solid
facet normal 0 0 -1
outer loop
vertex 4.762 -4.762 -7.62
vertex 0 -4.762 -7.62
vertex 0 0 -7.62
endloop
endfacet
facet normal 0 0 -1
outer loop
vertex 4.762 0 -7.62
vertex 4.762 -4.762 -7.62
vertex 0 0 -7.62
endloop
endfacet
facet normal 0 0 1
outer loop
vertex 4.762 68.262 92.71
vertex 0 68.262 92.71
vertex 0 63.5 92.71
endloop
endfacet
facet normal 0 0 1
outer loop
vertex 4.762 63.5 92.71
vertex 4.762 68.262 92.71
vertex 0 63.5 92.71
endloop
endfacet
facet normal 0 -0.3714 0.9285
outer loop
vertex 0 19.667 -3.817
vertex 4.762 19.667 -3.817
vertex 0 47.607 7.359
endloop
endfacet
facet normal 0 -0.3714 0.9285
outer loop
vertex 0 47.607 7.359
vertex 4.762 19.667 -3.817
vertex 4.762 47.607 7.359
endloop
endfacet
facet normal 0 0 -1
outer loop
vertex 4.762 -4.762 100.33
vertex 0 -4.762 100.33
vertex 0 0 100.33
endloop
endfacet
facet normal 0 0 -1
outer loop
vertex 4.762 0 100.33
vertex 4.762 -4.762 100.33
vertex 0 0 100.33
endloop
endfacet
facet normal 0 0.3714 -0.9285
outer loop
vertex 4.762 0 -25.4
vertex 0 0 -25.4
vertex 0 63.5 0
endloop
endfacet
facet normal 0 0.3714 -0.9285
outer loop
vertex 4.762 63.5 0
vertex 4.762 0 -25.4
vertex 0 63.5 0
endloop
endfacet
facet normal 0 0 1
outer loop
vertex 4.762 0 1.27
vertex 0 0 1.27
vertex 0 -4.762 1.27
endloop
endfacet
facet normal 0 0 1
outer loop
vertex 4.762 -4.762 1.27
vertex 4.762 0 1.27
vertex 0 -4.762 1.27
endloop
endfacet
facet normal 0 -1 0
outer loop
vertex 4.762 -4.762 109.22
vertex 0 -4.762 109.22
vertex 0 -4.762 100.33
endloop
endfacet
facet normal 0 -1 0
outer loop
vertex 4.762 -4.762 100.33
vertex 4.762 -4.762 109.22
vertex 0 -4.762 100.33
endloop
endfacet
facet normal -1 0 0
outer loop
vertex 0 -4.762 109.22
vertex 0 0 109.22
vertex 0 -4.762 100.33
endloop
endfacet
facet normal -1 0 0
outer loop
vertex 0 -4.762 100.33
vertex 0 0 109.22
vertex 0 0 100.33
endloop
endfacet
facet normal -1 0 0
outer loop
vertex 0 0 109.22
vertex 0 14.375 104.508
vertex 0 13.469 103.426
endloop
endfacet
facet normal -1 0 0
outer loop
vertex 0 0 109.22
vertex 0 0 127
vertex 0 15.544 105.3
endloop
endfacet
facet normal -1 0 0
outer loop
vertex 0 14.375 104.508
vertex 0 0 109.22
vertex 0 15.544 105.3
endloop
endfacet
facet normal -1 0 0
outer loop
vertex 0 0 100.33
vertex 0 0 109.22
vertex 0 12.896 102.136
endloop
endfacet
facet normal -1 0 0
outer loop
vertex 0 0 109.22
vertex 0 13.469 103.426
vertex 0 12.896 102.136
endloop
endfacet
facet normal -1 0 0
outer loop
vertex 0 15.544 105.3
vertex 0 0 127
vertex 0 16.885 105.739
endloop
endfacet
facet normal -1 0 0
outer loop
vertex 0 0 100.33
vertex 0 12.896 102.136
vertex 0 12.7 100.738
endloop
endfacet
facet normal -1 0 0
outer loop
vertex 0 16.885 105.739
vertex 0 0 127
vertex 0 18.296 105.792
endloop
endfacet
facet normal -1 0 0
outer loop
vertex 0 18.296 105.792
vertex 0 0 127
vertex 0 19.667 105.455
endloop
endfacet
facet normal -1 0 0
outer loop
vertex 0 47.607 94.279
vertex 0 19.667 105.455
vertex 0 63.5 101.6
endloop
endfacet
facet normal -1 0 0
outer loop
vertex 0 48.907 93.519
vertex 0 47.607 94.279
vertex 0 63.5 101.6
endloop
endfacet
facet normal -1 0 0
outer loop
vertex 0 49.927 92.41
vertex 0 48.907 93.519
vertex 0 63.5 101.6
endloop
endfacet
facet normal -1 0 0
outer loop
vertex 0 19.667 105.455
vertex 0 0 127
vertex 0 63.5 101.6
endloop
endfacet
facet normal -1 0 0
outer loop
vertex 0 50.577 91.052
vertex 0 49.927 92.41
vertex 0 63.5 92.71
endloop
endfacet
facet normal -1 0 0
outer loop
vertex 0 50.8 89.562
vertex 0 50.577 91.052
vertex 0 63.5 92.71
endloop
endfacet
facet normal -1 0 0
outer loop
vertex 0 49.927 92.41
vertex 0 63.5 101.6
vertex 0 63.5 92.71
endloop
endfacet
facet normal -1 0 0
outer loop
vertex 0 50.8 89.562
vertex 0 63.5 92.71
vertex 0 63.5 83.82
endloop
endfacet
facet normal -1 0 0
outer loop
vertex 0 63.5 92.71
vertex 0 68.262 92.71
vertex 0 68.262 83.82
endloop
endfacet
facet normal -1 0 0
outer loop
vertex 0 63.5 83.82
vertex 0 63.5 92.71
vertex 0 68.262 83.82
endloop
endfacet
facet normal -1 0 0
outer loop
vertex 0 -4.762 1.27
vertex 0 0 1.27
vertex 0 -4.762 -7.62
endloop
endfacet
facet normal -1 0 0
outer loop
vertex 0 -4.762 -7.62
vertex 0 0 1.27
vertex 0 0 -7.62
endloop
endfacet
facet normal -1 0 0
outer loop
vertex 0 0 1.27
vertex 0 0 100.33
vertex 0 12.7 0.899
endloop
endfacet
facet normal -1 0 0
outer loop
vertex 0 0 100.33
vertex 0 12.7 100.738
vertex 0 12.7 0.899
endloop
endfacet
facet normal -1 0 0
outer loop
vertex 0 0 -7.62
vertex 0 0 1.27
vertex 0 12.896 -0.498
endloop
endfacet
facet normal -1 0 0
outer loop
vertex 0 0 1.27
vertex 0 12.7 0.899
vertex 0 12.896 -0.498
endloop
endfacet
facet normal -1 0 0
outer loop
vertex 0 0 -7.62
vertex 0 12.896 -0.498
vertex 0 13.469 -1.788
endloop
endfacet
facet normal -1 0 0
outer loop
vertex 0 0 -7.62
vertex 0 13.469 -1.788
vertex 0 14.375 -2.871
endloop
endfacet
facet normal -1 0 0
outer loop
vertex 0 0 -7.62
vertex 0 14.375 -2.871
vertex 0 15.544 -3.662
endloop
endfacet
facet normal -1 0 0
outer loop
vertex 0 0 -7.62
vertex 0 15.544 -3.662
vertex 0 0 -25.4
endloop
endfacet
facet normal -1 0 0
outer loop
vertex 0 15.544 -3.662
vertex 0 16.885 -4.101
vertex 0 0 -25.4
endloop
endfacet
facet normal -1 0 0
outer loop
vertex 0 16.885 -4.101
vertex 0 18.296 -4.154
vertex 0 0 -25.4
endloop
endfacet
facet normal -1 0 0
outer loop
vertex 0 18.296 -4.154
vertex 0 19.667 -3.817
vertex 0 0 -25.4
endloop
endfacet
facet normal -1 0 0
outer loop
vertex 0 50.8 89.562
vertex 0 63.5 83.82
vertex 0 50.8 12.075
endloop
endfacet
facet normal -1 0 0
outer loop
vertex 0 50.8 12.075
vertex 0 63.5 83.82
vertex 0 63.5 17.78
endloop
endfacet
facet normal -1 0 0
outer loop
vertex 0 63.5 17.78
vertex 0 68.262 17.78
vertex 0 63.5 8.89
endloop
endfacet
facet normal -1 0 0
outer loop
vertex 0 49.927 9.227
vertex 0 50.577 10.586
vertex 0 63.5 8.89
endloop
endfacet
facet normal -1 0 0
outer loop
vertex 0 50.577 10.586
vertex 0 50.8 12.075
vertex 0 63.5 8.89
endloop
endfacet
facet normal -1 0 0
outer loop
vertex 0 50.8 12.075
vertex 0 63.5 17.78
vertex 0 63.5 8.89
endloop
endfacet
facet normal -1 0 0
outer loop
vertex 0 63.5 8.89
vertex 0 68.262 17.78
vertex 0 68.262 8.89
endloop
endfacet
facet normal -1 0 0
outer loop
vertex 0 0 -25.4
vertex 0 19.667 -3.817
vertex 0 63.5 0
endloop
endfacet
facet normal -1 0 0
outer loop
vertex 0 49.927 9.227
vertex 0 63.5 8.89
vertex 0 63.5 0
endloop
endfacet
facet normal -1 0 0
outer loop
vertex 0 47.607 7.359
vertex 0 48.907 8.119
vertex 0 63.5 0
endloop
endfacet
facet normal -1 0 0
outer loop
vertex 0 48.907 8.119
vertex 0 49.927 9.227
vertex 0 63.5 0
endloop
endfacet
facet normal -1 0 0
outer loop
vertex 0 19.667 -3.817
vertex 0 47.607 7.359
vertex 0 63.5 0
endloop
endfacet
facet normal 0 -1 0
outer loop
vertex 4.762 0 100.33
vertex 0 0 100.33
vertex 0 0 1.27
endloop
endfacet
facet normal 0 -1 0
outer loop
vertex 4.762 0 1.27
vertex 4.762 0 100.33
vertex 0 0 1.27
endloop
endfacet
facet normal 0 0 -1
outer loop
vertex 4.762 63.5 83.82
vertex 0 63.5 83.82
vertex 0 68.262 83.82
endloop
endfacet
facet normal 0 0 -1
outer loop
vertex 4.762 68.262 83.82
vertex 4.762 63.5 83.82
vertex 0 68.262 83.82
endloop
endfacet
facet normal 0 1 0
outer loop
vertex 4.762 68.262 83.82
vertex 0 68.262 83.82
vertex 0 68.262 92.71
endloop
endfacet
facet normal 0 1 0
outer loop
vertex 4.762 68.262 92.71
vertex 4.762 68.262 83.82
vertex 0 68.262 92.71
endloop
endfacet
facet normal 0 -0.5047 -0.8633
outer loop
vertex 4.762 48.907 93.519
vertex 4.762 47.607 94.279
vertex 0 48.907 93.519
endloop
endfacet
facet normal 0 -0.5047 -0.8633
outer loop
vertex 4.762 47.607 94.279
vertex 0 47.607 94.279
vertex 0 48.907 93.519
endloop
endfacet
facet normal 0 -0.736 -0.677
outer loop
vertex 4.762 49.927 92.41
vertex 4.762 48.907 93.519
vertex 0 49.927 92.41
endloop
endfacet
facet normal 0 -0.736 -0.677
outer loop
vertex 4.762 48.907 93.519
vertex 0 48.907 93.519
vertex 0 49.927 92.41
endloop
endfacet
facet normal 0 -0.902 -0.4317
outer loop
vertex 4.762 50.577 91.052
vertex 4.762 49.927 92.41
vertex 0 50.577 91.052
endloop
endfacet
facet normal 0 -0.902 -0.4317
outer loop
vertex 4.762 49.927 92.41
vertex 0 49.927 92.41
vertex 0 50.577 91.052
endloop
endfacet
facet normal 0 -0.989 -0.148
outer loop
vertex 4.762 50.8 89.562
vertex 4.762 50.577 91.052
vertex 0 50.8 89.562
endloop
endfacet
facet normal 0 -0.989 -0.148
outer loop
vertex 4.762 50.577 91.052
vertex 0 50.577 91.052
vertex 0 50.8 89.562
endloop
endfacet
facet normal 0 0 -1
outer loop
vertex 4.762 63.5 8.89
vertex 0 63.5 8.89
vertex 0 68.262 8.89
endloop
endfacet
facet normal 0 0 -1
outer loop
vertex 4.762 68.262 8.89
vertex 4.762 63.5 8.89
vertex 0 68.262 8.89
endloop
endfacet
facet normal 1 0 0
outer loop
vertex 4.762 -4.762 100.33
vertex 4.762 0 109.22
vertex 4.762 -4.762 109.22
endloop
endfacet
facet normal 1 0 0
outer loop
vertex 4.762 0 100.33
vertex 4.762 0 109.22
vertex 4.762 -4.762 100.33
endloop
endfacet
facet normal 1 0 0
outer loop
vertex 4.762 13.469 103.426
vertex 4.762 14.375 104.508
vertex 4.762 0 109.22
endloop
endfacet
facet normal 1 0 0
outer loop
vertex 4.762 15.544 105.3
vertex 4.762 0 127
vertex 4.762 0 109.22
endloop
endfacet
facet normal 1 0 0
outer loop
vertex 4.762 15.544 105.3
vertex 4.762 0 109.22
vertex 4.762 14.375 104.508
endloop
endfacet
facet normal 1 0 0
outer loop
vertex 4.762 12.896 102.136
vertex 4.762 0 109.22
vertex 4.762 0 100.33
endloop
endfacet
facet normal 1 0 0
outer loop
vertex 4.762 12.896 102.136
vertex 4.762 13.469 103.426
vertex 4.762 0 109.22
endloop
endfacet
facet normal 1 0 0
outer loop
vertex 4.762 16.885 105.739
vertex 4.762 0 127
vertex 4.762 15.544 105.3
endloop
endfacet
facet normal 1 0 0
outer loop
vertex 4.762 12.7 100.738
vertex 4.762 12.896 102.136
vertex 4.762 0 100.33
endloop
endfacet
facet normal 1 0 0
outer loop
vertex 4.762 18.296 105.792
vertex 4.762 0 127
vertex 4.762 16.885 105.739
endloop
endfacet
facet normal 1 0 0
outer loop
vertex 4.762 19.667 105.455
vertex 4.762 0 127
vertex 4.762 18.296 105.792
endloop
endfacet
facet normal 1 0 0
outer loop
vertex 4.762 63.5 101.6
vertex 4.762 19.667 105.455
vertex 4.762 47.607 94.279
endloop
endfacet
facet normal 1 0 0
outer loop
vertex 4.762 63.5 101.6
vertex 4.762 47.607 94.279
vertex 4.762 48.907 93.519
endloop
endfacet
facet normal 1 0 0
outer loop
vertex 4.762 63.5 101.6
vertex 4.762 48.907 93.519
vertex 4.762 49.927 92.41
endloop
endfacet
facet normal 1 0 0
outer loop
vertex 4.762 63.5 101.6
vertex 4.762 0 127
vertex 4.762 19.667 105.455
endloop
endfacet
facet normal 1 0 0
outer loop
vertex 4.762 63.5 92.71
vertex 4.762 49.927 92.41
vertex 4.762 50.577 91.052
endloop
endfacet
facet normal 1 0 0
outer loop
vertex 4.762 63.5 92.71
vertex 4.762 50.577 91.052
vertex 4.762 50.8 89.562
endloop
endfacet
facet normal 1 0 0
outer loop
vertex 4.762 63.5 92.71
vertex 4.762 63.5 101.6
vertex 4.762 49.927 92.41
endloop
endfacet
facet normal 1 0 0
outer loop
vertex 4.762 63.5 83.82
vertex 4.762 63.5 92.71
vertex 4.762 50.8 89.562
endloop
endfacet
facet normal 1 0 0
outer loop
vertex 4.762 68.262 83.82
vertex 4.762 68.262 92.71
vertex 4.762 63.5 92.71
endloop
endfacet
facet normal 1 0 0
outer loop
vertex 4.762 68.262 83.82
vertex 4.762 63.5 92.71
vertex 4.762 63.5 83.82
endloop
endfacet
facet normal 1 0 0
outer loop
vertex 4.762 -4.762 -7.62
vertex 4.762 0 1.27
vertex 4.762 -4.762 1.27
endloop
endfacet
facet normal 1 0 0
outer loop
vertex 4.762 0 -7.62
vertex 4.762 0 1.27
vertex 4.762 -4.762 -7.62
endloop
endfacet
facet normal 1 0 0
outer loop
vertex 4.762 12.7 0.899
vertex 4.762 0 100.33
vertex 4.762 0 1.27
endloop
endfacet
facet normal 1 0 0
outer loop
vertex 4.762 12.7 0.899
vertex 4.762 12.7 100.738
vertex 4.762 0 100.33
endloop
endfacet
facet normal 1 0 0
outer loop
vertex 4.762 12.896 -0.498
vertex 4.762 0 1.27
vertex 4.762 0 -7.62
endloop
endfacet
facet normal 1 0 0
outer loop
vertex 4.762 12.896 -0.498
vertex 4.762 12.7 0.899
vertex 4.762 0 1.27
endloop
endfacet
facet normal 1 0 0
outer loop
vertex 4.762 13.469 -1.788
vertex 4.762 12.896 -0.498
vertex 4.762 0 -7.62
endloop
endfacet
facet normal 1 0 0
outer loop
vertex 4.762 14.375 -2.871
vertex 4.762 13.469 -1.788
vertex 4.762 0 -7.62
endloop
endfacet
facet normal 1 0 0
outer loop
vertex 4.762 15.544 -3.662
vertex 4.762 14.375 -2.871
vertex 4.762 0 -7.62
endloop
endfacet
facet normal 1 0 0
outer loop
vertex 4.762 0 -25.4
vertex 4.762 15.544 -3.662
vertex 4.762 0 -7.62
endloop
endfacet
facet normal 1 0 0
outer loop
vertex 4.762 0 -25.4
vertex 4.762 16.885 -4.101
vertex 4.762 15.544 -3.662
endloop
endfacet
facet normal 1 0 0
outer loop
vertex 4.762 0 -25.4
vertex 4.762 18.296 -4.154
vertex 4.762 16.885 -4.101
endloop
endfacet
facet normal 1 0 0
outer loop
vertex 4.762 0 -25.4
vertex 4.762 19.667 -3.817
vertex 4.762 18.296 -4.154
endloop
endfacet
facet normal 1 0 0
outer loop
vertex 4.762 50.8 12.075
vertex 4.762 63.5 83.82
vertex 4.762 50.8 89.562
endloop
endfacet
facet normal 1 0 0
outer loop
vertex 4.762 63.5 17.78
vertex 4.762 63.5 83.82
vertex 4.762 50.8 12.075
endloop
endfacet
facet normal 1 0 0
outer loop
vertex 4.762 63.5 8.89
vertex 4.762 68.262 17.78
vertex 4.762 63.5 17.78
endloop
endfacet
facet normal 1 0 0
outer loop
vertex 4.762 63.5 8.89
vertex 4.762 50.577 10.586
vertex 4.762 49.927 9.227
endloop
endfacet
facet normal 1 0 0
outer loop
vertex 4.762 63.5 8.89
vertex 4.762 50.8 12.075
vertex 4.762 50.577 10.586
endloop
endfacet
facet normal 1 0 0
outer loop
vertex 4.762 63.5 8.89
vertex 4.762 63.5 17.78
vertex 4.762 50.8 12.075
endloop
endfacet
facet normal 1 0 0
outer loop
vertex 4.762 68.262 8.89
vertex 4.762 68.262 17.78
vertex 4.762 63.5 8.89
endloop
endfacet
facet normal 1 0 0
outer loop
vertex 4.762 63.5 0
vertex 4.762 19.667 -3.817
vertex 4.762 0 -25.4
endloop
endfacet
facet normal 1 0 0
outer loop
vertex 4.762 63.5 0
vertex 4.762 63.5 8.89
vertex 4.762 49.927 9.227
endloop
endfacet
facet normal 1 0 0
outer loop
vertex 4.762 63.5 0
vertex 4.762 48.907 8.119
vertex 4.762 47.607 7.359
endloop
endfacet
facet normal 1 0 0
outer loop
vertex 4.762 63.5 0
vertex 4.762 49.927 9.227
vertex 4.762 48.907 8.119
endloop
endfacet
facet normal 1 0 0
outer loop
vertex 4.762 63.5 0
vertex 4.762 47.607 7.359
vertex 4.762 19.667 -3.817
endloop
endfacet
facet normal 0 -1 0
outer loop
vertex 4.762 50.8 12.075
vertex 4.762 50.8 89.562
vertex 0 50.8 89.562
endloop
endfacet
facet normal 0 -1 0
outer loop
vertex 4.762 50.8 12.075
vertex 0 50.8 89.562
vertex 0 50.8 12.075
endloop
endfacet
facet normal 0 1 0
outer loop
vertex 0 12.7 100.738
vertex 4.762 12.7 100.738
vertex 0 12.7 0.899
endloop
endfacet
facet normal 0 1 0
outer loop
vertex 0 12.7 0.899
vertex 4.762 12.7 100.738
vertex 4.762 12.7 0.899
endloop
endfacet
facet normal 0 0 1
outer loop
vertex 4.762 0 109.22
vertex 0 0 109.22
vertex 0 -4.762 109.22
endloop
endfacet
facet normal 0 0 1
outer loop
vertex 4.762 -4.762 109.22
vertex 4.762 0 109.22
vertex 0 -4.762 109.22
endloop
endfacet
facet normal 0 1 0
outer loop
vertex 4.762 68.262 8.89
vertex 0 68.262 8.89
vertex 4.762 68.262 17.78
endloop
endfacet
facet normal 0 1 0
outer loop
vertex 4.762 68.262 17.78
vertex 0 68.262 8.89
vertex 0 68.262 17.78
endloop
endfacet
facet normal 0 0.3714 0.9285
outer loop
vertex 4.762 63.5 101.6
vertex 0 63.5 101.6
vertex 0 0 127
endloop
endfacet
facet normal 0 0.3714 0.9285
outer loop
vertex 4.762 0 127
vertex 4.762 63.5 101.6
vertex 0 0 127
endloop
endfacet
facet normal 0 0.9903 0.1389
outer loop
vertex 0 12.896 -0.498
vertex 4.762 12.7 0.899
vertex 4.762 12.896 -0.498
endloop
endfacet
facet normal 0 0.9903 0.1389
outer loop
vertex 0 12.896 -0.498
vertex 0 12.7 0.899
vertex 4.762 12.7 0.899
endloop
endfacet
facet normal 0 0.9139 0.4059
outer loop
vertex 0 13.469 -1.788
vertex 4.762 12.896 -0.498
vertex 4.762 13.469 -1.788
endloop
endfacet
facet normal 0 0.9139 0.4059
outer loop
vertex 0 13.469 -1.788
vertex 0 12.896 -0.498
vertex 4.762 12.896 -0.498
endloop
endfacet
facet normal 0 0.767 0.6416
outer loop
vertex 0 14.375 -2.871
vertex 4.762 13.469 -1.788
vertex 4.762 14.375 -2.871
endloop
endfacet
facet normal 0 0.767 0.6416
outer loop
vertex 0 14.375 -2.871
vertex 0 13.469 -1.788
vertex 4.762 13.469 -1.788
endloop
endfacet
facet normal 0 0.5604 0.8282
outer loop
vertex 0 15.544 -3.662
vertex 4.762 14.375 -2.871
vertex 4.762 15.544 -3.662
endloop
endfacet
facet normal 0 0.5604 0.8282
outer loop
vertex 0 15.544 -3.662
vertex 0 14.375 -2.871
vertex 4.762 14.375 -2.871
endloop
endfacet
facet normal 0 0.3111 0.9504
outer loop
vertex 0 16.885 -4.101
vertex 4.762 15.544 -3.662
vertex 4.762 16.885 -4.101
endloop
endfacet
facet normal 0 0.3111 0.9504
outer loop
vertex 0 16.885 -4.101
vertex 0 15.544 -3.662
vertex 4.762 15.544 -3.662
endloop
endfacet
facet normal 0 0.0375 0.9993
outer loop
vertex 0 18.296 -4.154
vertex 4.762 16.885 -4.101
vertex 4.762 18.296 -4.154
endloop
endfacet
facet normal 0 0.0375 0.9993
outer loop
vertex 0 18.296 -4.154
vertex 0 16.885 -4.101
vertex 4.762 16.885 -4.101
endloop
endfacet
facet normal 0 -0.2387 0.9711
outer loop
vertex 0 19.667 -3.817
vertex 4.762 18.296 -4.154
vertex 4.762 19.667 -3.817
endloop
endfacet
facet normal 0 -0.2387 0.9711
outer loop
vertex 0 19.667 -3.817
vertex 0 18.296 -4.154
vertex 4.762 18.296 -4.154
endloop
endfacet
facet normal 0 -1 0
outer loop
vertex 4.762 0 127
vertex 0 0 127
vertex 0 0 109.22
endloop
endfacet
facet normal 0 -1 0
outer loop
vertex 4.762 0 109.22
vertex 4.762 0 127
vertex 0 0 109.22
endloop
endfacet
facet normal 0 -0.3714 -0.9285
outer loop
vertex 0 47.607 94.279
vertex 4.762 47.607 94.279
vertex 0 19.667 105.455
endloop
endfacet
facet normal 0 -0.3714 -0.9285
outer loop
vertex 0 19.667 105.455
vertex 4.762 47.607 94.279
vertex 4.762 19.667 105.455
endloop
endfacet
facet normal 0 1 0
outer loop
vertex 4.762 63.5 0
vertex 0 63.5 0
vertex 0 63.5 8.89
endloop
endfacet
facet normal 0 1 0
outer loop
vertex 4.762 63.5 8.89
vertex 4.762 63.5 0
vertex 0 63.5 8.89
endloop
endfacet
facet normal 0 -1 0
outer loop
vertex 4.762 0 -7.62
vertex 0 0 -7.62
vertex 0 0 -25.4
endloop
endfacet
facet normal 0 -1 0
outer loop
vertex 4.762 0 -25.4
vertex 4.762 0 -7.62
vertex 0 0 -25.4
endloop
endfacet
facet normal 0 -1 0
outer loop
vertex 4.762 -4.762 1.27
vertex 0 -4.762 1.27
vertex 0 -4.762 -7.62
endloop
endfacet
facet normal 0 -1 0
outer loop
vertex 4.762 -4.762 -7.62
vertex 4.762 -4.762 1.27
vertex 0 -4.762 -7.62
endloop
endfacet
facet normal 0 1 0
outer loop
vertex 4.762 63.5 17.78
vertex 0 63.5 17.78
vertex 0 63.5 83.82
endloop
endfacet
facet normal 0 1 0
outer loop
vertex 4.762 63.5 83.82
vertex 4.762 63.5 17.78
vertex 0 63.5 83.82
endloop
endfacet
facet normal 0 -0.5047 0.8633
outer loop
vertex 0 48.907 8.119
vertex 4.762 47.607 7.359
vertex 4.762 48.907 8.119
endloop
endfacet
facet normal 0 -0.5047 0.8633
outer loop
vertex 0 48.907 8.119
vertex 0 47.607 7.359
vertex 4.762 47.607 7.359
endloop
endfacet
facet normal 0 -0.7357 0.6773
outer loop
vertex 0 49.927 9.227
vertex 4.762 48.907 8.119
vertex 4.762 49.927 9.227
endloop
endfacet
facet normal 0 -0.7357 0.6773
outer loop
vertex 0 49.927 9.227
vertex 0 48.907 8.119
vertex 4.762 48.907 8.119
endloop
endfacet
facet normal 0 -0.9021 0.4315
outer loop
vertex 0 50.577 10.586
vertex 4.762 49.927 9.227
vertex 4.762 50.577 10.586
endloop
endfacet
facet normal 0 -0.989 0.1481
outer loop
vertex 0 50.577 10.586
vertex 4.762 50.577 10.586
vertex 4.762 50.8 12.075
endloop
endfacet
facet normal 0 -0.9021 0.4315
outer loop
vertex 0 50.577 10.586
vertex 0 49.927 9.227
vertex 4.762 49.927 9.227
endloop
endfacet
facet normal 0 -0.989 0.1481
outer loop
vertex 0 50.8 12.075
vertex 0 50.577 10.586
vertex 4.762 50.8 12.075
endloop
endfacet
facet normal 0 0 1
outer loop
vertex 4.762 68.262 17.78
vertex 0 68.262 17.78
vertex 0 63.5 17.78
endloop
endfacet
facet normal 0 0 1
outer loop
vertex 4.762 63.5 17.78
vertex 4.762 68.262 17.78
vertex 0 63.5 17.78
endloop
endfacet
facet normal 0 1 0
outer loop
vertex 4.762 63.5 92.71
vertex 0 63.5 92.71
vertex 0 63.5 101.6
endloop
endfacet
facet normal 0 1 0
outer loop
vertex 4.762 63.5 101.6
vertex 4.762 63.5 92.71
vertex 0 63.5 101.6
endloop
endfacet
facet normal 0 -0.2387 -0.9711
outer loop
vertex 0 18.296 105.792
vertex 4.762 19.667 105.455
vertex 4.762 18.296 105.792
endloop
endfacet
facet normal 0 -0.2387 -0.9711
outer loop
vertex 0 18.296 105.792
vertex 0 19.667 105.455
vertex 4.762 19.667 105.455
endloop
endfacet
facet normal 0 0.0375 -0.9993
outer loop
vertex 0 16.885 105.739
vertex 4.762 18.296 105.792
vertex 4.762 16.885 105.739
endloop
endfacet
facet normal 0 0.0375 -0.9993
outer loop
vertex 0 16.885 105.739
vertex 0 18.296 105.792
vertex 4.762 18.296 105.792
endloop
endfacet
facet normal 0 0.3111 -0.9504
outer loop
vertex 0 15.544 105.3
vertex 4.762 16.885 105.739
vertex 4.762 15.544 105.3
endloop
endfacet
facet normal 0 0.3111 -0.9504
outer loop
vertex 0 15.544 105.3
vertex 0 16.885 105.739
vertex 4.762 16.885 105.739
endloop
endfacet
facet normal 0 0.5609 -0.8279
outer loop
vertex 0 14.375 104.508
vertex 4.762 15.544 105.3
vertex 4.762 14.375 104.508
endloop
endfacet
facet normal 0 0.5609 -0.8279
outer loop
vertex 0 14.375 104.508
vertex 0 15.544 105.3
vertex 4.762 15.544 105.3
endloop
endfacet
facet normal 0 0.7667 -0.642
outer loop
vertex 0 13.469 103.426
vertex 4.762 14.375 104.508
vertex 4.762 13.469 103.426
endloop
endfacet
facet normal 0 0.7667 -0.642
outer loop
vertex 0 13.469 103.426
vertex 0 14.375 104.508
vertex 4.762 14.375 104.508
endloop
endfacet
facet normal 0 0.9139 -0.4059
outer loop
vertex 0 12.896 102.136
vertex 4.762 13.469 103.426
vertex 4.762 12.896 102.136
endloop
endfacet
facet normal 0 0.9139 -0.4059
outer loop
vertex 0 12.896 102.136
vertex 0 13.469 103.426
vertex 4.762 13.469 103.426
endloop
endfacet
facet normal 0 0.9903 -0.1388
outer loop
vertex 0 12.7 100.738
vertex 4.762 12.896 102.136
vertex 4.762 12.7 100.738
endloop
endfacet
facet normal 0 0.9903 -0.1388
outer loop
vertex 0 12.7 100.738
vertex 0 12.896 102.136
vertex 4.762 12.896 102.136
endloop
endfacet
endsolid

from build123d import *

# Parameters (mm, degrees)
BOSS_EXTRUDE1_DEPTH = 4.7625
SKETCH2_W           = 84.36568139
SKETCH2_H           = 38.1
CUT_EXTRUDE1_DEPTH  = 4.7625
FILLET1_R           = 5.08


with BuildPart() as part:
    # Sketch1 → Boss-Extrude1 (new body)
    with BuildSketch(Plane(origin=(0, 0, 0), x_dir=(0, 0, -1), z_dir=(1, 0, 0))):
        Polygon((-92.71, 63.5), (-101.6, 63.5), (-127, 0), (-109.22, 0), (-109.22, -4.7625), (-100.33, -4.7625), (-100.33, 0), (-1.27, 0), (-1.27, -4.7625), (7.62, -4.7625), (7.62, 0), (25.4, 0), (0, 63.5), (-8.89, 63.5), (-8.89, 68.2625), (-17.78, 68.2625), (-17.78, 63.5), (-83.82, 63.5), (-83.82, 68.2625), (-92.71, 68.2625), align=None)
    extrude(amount=BOSS_EXTRUDE1_DEPTH)

    # Sketch2 → Cut-Extrude1 (cut)
    with BuildSketch(Plane(origin=(4.7625, 0, 0), x_dir=(0, 0, -1), z_dir=(1, 0, 0))):
        with Locations((-50.818840695, 31.75)):
            Rectangle(SKETCH2_W, SKETCH2_H)
        Polygon((-93.00168139, 12.7), (-93.00168139, 50.8), (-108.24168139, 12.7), align=None)
        Polygon((6.604, 12.7), (-8.636, 50.8), (-8.636, 12.7), align=None)
    extrude(amount=-CUT_EXTRUDE1_DEPTH, mode=Mode.SUBTRACT)

    # Fillet1
    fillet1_edges = [part.edges().sort_by_distance(p)[0] for p in [
        (2.38125, 12.7, 108.24168139),
        (2.38125, 50.8, 93.00168139),
        (2.38125, 50.8, 8.636),
        (2.38125, 12.7, -6.604),
    ]]
    fillet(fillet1_edges, radius=FILLET1_R)


solid = part.part
